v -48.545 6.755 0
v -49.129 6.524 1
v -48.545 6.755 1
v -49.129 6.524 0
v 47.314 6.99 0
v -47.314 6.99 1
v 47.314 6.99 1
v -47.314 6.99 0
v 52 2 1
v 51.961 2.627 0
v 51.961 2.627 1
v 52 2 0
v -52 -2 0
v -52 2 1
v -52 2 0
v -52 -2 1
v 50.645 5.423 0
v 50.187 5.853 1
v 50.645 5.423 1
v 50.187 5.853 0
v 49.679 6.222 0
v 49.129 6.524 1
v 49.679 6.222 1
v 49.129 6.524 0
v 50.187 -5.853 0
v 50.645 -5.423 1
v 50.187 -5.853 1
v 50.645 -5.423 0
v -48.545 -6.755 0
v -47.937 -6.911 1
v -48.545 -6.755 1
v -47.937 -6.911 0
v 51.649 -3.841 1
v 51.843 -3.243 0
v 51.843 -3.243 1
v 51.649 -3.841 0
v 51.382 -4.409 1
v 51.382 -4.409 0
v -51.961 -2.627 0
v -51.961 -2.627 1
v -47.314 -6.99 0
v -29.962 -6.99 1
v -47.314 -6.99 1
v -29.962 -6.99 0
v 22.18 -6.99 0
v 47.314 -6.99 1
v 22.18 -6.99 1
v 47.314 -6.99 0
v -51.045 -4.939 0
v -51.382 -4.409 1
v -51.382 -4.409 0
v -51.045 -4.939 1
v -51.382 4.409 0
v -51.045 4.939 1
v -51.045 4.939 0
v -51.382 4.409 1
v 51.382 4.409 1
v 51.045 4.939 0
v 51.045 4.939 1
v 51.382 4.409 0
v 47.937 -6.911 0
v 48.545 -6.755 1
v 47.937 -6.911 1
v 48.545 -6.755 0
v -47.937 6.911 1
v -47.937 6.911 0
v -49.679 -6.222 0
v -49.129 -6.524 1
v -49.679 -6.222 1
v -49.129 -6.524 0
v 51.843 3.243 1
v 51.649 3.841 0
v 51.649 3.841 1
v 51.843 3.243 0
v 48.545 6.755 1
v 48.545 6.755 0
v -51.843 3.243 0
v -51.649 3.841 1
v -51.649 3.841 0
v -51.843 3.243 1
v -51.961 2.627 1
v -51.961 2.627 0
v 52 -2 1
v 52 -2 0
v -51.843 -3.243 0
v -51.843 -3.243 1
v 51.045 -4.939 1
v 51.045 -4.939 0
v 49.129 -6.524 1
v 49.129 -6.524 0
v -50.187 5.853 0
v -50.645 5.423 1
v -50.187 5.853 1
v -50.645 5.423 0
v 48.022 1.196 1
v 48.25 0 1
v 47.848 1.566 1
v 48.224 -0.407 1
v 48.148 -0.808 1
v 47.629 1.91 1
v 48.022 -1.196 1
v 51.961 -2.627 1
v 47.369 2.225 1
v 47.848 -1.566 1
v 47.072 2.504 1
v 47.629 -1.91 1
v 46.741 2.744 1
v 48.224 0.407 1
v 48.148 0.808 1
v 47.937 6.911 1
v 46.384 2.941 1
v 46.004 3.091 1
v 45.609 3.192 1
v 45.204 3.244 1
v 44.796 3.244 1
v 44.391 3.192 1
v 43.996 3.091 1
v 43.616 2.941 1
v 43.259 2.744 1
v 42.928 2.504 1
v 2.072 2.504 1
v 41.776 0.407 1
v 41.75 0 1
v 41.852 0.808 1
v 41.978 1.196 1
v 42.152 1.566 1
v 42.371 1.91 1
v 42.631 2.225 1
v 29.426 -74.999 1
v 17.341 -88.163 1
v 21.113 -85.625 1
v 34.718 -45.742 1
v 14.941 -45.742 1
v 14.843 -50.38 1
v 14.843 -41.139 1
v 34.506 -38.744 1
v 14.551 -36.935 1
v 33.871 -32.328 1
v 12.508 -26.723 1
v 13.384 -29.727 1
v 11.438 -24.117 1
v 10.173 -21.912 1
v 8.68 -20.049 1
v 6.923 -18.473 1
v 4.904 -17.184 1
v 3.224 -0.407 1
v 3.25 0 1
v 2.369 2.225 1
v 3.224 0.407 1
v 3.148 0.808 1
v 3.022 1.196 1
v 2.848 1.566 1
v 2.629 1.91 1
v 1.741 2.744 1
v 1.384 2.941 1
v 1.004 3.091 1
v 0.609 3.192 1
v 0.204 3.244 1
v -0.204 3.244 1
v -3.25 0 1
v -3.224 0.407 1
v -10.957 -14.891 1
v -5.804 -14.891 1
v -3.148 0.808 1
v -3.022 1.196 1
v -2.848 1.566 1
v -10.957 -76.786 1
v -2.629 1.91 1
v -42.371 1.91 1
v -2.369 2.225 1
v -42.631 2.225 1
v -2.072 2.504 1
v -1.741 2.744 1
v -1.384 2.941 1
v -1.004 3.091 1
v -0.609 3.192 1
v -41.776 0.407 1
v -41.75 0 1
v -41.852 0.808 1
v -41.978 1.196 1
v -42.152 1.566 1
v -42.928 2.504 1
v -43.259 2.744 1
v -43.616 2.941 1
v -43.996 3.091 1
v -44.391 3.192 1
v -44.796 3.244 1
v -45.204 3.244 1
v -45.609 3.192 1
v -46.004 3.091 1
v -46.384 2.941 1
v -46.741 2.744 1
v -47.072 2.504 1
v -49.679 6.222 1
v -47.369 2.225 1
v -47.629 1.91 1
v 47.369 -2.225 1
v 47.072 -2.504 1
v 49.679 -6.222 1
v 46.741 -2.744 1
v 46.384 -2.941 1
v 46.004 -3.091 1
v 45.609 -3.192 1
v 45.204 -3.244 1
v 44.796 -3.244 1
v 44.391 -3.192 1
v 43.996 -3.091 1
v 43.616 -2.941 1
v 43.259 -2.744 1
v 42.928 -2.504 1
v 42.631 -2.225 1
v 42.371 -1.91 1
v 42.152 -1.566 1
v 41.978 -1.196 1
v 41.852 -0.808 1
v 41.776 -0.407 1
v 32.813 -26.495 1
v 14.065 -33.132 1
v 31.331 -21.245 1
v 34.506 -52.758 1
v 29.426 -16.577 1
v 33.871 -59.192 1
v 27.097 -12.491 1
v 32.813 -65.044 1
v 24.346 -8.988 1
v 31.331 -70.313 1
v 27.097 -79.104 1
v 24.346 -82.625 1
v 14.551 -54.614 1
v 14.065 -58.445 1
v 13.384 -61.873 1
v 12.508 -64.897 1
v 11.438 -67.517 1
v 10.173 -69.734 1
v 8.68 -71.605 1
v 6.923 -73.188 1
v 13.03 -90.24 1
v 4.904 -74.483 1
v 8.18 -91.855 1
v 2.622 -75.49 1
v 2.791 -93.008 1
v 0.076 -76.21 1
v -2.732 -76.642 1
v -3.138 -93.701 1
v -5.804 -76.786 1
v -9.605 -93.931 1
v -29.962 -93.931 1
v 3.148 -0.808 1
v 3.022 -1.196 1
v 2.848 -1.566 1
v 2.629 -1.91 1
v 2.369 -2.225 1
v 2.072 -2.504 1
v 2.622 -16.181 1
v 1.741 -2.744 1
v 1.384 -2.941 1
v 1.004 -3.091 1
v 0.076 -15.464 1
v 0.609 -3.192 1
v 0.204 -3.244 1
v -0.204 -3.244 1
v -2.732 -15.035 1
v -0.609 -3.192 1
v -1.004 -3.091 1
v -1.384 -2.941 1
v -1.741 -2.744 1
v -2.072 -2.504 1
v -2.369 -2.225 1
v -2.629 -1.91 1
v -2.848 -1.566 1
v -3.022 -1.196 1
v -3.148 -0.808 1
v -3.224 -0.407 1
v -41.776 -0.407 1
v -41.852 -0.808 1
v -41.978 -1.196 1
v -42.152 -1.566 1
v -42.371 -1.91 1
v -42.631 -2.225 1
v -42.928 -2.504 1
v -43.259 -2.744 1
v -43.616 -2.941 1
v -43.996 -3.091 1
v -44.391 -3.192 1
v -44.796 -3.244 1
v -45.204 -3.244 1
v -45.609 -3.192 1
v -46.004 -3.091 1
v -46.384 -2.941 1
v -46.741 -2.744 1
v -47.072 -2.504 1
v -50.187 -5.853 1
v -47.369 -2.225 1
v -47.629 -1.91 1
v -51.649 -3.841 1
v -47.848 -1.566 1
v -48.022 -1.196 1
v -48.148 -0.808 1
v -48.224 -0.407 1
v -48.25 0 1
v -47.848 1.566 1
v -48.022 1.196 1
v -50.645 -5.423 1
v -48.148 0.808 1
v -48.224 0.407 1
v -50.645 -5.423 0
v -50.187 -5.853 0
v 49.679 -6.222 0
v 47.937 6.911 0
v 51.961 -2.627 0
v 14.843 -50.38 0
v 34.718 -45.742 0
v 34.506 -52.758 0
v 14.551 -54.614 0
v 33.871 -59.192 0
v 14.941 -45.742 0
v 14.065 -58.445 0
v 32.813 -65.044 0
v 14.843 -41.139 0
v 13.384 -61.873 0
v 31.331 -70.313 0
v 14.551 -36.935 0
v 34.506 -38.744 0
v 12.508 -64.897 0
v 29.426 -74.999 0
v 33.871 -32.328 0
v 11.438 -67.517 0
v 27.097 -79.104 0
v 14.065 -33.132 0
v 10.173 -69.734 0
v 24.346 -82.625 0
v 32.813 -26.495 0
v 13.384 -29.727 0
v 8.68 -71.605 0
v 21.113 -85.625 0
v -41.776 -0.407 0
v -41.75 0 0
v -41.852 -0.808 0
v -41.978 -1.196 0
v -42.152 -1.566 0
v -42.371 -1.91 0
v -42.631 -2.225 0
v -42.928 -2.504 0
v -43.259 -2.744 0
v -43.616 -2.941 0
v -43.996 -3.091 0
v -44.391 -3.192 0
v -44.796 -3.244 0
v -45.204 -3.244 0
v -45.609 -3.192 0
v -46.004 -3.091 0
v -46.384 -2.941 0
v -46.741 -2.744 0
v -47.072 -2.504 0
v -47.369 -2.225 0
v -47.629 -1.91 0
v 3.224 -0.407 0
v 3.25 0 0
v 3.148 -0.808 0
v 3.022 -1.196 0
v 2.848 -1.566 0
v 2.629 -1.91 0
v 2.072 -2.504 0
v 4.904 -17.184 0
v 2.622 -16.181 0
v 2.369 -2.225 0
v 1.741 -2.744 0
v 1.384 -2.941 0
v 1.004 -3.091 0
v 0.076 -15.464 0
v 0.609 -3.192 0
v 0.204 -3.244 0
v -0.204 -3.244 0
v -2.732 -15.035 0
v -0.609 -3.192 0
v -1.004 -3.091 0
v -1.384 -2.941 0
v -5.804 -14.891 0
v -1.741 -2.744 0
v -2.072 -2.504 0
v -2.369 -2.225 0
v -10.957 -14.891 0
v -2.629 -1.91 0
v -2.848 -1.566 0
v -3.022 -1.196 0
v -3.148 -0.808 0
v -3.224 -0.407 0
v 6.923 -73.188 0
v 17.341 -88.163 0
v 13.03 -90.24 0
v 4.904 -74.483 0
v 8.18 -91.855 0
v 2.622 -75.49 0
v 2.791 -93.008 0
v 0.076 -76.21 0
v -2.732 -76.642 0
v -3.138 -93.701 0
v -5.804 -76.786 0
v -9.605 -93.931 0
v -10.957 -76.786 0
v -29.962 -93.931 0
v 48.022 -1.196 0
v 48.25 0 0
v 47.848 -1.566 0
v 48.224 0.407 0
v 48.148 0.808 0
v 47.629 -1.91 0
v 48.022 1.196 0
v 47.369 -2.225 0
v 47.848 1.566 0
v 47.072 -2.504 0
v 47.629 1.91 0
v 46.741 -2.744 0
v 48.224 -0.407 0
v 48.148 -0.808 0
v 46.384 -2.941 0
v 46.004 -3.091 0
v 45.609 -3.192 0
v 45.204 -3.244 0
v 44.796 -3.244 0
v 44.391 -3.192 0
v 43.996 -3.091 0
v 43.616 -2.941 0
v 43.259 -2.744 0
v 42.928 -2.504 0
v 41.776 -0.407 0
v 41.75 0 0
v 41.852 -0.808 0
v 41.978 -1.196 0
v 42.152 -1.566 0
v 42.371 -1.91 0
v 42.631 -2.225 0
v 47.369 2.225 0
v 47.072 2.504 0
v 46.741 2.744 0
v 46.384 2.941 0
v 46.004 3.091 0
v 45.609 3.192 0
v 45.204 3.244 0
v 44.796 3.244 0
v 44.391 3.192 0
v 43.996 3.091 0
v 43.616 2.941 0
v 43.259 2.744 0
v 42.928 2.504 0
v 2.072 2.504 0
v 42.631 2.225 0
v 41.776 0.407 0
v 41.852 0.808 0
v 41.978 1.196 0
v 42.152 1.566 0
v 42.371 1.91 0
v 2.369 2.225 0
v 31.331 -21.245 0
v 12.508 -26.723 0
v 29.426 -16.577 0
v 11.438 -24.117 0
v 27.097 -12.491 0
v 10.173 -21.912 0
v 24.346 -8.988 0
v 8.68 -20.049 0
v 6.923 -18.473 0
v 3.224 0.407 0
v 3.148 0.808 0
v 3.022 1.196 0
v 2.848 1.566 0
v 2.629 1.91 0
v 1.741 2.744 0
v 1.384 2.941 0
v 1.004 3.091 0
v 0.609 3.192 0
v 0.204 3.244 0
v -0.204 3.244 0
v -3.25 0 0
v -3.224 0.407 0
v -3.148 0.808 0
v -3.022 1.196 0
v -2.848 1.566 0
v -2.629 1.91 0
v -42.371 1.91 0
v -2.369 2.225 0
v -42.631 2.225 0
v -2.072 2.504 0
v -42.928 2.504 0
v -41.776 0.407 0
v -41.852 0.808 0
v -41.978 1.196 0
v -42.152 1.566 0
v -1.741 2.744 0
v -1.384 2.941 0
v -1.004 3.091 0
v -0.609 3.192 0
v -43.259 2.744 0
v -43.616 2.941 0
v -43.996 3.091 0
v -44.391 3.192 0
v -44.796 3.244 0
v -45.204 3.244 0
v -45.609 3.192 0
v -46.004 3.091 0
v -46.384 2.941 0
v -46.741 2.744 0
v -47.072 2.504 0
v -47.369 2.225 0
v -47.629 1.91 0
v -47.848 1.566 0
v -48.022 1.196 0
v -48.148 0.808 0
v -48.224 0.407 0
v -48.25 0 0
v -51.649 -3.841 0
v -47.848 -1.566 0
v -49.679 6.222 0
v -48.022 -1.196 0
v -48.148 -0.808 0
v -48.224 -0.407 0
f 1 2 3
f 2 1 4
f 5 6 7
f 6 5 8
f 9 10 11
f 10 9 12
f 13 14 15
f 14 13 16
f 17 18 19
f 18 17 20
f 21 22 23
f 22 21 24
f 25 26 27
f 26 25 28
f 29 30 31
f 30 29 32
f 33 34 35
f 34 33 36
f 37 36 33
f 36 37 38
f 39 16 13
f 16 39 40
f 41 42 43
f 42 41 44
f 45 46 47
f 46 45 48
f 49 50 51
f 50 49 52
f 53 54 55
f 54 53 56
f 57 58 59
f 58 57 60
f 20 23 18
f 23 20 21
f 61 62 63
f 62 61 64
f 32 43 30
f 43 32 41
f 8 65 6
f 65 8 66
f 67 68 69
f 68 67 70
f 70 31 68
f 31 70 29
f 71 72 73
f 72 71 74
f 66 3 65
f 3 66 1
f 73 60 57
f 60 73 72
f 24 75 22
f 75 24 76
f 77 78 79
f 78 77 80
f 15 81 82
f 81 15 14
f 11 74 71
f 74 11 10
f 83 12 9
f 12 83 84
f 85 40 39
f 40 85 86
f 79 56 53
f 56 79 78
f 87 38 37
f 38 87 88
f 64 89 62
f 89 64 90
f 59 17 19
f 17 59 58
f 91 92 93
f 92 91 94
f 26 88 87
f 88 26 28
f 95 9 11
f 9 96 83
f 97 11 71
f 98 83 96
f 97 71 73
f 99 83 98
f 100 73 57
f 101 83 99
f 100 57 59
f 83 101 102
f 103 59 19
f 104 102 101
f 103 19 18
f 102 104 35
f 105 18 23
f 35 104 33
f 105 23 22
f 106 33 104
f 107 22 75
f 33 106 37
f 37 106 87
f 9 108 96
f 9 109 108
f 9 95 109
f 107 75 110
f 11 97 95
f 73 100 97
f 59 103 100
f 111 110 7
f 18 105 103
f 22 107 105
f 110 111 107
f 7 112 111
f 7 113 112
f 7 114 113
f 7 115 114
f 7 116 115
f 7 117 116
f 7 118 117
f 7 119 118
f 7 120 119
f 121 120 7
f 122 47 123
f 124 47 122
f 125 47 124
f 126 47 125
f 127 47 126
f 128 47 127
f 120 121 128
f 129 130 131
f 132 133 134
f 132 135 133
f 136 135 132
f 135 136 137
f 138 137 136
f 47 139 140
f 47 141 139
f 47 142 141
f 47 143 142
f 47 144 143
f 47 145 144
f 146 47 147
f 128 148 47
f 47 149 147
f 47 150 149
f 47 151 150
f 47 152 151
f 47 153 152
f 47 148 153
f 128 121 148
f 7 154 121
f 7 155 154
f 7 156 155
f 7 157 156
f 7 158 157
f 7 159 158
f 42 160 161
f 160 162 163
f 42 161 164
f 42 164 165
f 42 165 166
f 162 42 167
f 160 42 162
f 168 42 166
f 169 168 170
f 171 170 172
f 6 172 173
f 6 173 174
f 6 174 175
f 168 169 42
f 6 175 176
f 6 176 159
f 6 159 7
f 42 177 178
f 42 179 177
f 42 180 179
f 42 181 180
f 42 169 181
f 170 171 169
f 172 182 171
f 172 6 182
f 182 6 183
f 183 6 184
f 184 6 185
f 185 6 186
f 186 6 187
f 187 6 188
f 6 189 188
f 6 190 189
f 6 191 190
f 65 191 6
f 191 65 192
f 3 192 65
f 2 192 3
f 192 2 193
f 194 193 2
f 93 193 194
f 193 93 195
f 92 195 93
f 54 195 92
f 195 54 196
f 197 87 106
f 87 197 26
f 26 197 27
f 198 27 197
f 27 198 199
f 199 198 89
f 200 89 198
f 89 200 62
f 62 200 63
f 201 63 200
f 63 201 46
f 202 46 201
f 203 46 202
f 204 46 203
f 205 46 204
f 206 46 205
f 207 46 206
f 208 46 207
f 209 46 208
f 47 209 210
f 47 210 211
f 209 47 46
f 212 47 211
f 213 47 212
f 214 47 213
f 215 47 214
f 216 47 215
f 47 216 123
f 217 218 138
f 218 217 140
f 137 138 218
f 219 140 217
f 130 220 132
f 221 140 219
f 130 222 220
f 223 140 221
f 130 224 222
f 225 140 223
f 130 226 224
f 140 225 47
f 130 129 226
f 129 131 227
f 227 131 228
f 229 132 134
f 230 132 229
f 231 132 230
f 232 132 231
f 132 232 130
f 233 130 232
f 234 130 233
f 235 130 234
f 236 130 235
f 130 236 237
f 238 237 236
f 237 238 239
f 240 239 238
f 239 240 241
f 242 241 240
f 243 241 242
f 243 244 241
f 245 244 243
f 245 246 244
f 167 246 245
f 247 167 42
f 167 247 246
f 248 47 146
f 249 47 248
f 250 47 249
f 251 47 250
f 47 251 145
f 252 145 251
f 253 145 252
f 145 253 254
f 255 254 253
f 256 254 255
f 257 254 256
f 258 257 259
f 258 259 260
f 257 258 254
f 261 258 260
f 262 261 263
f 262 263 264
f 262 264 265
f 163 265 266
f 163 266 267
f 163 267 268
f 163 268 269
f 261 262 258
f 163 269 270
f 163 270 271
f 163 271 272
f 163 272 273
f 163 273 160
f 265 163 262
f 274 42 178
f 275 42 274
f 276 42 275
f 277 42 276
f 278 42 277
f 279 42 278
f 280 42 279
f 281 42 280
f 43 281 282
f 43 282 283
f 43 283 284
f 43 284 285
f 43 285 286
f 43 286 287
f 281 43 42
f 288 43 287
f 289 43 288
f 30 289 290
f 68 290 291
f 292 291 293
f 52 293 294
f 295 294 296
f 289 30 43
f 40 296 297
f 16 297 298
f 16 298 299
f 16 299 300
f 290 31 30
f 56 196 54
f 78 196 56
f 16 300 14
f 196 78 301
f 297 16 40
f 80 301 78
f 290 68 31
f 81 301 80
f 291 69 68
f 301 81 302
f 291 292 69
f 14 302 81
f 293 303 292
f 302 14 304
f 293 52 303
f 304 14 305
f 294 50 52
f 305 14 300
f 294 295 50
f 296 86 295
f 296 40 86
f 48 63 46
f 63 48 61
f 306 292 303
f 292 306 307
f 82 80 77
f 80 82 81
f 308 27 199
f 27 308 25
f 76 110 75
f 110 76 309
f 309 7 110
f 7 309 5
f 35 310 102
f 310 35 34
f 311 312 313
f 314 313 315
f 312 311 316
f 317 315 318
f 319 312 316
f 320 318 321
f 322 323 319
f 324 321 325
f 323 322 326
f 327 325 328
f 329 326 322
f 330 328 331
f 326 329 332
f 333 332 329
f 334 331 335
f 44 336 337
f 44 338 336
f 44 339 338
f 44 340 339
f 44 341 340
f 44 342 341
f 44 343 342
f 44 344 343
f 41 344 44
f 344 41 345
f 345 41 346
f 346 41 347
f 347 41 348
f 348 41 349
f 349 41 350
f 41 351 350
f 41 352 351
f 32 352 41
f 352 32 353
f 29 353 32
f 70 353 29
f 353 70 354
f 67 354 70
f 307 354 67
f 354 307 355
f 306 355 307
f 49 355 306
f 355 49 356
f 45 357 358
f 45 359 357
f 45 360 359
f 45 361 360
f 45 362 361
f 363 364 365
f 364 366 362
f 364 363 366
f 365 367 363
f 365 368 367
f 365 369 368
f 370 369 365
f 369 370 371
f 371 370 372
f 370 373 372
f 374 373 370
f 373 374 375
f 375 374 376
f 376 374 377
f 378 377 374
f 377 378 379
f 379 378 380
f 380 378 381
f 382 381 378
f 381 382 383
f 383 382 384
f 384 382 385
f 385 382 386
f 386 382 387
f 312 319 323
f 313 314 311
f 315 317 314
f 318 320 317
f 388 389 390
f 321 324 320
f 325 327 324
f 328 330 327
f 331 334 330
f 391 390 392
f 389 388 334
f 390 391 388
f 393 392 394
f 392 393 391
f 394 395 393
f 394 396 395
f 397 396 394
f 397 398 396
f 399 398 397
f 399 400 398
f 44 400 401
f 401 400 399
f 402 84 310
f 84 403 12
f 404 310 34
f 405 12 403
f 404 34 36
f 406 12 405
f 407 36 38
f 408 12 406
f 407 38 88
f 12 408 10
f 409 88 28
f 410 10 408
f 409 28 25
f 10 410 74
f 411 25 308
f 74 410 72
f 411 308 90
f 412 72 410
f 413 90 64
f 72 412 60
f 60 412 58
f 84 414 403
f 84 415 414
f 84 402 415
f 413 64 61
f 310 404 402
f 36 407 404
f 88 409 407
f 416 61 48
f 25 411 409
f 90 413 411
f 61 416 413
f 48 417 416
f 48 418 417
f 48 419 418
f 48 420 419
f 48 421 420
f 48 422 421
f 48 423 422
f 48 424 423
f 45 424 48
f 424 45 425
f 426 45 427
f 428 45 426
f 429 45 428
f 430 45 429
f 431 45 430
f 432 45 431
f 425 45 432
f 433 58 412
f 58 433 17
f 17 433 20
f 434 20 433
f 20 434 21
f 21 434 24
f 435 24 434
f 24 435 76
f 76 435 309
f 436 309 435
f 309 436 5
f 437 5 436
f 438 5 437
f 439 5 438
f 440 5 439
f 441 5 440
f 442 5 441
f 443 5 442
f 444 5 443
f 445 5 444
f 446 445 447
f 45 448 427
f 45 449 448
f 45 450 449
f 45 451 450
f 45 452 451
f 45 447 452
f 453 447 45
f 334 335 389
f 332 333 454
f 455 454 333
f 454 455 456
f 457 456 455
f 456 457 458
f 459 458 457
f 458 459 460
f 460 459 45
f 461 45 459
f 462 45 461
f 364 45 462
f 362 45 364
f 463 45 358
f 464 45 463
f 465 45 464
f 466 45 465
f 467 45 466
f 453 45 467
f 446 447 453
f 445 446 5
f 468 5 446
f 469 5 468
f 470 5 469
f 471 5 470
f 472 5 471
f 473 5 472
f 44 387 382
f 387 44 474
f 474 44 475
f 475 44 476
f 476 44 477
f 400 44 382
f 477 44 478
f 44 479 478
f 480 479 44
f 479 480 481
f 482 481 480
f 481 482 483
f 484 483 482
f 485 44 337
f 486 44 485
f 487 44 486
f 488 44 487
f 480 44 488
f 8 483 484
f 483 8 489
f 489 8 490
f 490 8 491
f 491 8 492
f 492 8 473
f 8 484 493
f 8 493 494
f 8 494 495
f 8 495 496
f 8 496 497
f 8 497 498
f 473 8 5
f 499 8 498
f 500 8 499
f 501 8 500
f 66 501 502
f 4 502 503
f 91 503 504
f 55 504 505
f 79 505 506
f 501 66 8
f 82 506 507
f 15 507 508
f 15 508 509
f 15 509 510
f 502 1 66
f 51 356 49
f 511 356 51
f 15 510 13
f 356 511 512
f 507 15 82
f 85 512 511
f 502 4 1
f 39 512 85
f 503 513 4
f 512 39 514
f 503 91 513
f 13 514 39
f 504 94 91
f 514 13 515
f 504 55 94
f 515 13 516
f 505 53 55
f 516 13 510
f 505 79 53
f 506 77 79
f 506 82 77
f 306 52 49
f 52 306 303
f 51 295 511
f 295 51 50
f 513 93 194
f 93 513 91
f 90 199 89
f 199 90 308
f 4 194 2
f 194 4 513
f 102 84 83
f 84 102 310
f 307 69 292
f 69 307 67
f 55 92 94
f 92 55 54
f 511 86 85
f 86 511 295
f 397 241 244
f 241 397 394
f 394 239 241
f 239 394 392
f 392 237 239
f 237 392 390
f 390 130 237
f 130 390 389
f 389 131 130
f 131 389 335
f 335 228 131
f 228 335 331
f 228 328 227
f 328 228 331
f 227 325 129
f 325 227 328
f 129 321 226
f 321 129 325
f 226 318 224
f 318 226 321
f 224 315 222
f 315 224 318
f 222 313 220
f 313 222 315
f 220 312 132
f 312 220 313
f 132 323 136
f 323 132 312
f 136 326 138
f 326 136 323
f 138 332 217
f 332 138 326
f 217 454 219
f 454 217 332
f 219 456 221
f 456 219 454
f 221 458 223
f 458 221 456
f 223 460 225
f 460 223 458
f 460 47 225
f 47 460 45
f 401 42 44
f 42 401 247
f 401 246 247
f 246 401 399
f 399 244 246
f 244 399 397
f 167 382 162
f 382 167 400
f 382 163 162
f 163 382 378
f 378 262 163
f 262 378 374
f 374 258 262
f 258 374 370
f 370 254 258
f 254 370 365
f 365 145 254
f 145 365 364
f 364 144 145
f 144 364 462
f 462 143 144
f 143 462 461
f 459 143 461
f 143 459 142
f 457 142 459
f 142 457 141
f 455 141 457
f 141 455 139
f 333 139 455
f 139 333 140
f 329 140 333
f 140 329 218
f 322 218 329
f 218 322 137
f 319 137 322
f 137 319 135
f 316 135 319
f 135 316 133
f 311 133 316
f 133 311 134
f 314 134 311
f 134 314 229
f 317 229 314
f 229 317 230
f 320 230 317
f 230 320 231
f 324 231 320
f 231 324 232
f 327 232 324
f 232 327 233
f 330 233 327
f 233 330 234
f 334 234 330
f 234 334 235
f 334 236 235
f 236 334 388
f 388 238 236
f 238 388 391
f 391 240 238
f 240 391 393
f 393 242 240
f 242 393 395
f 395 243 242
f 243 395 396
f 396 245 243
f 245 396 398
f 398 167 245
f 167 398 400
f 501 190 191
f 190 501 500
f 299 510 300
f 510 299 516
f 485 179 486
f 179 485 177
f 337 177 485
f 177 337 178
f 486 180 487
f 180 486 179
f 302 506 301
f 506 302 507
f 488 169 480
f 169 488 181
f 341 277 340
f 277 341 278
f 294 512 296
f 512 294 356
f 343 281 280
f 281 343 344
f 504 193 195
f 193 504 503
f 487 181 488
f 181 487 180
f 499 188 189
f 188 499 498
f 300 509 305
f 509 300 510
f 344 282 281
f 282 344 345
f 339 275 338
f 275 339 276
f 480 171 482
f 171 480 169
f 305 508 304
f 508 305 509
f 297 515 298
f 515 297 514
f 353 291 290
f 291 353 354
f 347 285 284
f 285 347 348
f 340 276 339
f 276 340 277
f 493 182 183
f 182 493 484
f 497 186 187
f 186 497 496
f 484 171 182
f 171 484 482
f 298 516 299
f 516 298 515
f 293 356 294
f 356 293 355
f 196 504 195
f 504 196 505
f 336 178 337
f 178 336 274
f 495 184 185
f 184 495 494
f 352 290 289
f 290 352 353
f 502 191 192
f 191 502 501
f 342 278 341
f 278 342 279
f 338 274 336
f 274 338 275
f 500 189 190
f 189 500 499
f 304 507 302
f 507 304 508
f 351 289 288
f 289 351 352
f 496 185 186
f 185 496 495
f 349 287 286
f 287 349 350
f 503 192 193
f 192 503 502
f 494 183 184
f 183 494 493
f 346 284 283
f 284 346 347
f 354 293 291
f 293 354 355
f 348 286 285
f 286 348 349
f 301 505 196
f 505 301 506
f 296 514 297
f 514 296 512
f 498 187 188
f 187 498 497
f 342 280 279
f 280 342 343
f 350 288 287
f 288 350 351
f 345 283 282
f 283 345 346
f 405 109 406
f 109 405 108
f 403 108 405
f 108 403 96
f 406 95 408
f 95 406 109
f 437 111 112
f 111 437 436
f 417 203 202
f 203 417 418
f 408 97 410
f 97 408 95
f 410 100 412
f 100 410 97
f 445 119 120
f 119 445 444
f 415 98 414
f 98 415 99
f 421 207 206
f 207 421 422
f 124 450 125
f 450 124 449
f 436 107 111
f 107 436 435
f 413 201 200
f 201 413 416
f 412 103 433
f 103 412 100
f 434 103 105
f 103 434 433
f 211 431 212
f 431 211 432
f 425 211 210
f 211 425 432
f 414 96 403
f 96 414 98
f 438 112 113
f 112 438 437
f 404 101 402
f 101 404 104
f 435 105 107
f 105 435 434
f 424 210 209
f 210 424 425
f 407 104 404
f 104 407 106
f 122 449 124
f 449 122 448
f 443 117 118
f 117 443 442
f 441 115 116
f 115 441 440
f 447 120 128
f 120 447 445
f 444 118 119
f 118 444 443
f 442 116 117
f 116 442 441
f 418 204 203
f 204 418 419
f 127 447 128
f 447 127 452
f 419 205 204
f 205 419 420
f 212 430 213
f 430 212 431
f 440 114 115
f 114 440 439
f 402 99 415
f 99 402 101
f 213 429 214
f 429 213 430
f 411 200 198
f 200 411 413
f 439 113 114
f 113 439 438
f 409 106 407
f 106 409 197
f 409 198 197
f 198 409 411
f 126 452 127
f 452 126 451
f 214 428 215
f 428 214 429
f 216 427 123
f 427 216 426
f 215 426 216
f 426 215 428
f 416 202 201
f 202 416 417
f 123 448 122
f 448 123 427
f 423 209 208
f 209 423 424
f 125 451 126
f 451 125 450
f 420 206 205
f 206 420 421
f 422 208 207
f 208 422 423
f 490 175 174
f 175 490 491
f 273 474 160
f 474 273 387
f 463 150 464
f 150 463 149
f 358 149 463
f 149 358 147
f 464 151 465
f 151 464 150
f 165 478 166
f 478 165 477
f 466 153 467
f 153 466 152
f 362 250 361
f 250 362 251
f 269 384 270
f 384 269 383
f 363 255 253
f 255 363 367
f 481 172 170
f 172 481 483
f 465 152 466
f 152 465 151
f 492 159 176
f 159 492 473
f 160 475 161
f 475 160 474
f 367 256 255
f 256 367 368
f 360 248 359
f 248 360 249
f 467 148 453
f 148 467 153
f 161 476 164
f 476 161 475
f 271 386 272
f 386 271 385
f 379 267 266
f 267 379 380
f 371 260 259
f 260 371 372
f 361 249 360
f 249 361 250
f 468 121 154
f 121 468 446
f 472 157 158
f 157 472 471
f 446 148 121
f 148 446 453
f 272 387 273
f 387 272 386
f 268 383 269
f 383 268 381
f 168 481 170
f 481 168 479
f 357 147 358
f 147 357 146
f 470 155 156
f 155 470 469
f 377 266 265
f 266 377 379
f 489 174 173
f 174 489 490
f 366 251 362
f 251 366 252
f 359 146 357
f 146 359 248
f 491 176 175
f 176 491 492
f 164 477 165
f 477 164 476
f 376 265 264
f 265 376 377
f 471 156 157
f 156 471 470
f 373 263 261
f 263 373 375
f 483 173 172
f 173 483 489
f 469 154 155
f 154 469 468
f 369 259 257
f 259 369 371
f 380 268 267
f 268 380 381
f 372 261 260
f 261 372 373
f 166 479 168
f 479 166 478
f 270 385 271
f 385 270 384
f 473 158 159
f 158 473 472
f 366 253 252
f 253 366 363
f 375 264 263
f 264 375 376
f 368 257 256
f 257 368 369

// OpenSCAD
$fn = 50;


difference() {
	union() {
		translate(v = [0, 0, 0]) {
			rotate(a = [0, 0, 0]) {
				hull() {
					translate(v = [-47.0000000000, 2.0000000000, 0]) {
						rotate(a = [0, 0, 0]) {
							translate(v = [0, 0, 0]) {
								rotate(a = [0, 0, 0]) {
									cylinder(h = 1, r = 5);
								}
							}
						}
					}
					translate(v = [47.0000000000, 2.0000000000, 0]) {
						rotate(a = [0, 0, 0]) {
							translate(v = [0, 0, 0]) {
								rotate(a = [0, 0, 0]) {
									cylinder(h = 1, r = 5);
								}
							}
						}
					}
					translate(v = [-47.0000000000, -2.0000000000, 0]) {
						rotate(a = [0, 0, 0]) {
							translate(v = [0, 0, 0]) {
								rotate(a = [0, 0, 0]) {
									cylinder(h = 1, r = 5);
								}
							}
						}
					}
					translate(v = [47.0000000000, -2.0000000000, 0]) {
						rotate(a = [0, 0, 0]) {
							translate(v = [0, 0, 0]) {
								rotate(a = [0, 0, 0]) {
									cylinder(h = 1, r = 5);
								}
							}
						}
					}
				}
			}
		}
		translate(v = [0, 0, 0]) {
			rotate(a = [0, 0, 0]) {
				linear_extrude(height = 1) {
					text(font = "DejaVu Sans Mono:style=Bold", halign = "center", size = 95.0000000000, text = "D", valign = "top");
				}
			}
		}
	}
	union() {
		translate(v = [-45.0000000000, 0.0000000000, -125.0000000000]) {
			rotate(a = [0, 0, 0]) {
				cylinder(h = 250, r = 3.2500000000);
			}
		}
		translate(v = [45.0000000000, 0.0000000000, -125.0000000000]) {
			rotate(a = [0, 0, 0]) {
				cylinder(h = 250, r = 3.2500000000);
			}
		}
		translate(v = [45.0000000000, 0.0000000000, -125.0000000000]) {
			rotate(a = [0, 0, 0]) {
				cylinder(h = 250, r = 3.2500000000);
			}
		}
		translate(v = [0, 0, -125.0000000000]) {
			rotate(a = [0, 0, 0]) {
				cylinder(h = 250, r = 3.2500000000);
			}
		}
	}
}
